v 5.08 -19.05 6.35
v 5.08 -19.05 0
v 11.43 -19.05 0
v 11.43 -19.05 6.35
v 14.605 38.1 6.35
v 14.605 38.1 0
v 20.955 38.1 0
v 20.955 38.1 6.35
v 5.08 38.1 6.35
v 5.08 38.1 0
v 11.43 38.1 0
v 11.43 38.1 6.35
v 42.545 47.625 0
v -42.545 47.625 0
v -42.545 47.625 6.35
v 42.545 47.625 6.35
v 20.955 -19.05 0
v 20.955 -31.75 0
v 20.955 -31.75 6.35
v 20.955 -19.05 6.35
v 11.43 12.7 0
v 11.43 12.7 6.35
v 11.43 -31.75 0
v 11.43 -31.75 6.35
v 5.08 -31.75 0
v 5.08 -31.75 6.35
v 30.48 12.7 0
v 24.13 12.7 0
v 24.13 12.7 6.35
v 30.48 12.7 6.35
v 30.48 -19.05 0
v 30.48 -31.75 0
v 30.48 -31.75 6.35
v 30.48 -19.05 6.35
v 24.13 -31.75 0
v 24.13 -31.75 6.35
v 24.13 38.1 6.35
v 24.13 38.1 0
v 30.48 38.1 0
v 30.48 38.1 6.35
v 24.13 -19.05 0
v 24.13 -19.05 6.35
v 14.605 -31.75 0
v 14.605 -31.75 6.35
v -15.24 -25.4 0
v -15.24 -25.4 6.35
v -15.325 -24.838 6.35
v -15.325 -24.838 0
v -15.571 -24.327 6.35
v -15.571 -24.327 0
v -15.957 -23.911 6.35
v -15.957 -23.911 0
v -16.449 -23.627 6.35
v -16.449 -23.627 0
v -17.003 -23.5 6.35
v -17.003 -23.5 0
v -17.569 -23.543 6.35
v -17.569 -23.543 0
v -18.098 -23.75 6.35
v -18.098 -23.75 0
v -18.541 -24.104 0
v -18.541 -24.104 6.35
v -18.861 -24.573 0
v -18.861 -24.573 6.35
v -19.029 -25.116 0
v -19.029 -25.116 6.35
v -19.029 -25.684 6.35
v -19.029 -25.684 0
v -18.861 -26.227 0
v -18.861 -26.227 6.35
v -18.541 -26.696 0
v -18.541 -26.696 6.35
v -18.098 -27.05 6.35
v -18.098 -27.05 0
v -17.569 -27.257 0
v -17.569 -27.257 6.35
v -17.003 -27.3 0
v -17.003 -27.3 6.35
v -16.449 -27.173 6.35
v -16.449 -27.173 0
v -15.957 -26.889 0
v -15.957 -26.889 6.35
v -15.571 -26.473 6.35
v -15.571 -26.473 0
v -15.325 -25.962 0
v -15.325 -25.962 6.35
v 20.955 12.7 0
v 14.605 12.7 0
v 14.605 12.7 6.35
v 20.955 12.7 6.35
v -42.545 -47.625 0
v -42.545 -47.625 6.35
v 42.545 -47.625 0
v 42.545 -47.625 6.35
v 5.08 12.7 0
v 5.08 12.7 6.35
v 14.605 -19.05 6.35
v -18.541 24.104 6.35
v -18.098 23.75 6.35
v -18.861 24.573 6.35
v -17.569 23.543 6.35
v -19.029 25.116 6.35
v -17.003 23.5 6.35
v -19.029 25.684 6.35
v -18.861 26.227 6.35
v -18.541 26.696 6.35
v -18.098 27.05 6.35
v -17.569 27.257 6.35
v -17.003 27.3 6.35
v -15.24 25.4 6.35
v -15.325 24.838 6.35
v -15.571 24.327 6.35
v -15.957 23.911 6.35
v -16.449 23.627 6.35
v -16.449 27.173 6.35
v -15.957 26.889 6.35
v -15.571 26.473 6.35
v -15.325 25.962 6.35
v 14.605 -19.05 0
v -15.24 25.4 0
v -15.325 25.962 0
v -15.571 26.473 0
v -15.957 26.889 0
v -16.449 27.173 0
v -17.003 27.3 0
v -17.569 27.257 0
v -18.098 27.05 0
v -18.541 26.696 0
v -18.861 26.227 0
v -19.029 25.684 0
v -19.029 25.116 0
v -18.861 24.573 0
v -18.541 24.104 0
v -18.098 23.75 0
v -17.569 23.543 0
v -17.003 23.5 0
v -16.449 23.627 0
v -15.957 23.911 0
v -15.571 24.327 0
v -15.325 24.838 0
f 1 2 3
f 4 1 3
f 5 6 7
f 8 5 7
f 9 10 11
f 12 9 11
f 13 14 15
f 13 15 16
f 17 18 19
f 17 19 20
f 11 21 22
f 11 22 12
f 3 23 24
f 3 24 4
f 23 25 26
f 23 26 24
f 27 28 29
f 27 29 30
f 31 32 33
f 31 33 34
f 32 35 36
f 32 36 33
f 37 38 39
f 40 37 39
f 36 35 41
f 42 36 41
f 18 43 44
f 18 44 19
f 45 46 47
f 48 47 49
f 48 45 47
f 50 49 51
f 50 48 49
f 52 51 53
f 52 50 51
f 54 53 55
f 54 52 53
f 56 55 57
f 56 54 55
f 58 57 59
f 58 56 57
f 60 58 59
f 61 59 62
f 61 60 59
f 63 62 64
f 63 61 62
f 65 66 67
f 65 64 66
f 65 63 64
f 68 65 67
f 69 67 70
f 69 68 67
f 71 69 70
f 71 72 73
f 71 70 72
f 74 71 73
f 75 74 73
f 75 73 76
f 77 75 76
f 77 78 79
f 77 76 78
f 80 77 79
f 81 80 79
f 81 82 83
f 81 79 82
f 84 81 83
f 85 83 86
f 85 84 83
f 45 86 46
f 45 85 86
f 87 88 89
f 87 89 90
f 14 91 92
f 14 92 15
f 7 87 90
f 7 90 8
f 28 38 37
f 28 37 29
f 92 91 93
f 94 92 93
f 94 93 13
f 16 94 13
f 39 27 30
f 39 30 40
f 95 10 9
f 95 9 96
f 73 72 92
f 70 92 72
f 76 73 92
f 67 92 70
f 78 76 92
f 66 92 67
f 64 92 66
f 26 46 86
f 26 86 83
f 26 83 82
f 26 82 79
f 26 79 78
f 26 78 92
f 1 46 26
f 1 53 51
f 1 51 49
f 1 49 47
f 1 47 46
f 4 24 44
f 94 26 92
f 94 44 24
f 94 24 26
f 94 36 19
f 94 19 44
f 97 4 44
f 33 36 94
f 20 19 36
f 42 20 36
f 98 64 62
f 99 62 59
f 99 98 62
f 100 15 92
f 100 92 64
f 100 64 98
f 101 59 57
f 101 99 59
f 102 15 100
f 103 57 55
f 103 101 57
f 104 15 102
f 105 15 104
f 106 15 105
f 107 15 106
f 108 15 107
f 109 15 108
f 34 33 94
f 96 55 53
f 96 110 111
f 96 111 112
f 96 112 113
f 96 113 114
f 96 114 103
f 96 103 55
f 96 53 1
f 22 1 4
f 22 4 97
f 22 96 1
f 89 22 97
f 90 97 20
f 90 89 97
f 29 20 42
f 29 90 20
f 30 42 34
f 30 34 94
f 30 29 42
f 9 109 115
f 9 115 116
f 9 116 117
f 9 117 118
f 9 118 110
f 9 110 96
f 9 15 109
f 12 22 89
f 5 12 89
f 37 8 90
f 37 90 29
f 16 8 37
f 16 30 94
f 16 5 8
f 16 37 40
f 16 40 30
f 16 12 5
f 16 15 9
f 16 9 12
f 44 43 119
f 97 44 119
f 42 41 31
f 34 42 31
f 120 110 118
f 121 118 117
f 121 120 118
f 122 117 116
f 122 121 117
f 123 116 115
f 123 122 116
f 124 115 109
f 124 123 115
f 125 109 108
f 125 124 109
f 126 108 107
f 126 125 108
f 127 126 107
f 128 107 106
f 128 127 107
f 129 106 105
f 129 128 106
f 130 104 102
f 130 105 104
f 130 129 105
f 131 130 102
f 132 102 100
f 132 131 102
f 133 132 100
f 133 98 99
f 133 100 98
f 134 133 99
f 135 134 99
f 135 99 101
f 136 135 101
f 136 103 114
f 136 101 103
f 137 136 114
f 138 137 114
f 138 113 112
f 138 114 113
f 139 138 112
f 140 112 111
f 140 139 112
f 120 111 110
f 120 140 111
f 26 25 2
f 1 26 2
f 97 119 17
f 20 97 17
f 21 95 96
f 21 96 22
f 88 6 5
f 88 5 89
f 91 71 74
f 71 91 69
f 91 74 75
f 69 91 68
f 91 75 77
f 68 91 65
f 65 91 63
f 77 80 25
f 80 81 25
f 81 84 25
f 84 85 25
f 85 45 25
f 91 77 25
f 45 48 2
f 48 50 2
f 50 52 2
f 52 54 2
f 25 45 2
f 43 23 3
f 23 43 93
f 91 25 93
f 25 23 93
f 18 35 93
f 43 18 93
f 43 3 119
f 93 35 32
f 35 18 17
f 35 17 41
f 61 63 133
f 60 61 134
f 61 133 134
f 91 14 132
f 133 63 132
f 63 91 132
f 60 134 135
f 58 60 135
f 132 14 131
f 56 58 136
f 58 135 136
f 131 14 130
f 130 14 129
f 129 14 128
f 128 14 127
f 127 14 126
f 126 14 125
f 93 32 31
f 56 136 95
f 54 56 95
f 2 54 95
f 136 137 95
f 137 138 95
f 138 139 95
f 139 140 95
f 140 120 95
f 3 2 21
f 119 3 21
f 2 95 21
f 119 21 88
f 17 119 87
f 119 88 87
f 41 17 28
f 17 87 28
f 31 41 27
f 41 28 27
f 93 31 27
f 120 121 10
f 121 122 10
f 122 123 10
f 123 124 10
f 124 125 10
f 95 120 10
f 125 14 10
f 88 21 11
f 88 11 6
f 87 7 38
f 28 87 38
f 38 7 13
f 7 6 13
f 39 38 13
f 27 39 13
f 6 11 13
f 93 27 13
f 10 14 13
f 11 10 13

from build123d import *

# Parameters (mm, degrees)
F0_W     = 85.09
F0_H     = 95.25
F1_DEPTH = 6.35
F2_R     = 1.905
F2_W     = 6.35
F2_H     = 12.7
F2_H_2   = 6.35
F3_DEPTH = 6.351
F4_DEPTH = 132


# Not quite as in the source:
# - an extrude ends at something that could not be found from the text; its depth is read off the source's solid


with BuildPart() as f1:
    # F0 (on Top) → F1 (new body)
    with BuildSketch(Plane.XY):
        Rectangle(F0_W, F0_H)
    extrude(amount=F1_DEPTH)

    # F2 (on Top) → F3 (cut, through all)
    with BuildSketch(Plane.XY):
        with Locations((-17.145, -25.4)):
            Circle(F2_R)
        with Locations((-17.145, 25.4)):
            Circle(F2_R)
        with Locations((8.255, -25.4)):
            Rectangle(F2_W, F2_H)
        with Locations((8.255, 34.925)):
            Rectangle(F2_W, F2_H_2)
        with Locations((8.255, 25.4)):
            Rectangle(F2_W, F2_H)
        with Locations((8.255, 15.875)):
            Rectangle(F2_W, F2_H_2)
        with Locations((27.305, 25.4)):
            Rectangle(F2_W, F2_H)
        with Locations((27.305, 34.925)):
            Rectangle(F2_W, F2_H_2)
        with Locations((27.305, 15.875)):
            Rectangle(F2_W, F2_H_2)
        with Locations((27.305, -25.4)):
            Rectangle(F2_W, F2_H)
        with Locations((17.78, 34.925)):
            Rectangle(F2_W, F2_H_2)
        with Locations((17.78, 25.4)):
            Rectangle(F2_W, F2_H)
        with Locations((17.78, 15.875)):
            Rectangle(F2_W, F2_H_2)
        with Locations((17.78, -25.4)):
            Rectangle(F2_W, F2_H)
    extrude(amount=F3_DEPTH, mode=Mode.SUBTRACT)

    # F2 (on Top) → F4 (cut, through all)
    with BuildSketch(Plane.XY):
        with Locations((-17.145, -25.4)):
            Circle(F2_R)
        with Locations((-17.145, 25.4)):
            Circle(F2_R)
        with Locations((8.255, -25.4)):
            Rectangle(F2_W, F2_H)
        with Locations((8.255, 34.925)):
            Rectangle(F2_W, F2_H_2)
        with Locations((8.255, 25.4)):
            Rectangle(F2_W, F2_H)
        with Locations((8.255, 15.875)):
            Rectangle(F2_W, F2_H_2)
        with Locations((27.305, 25.4)):
            Rectangle(F2_W, F2_H)
        with Locations((27.305, 34.925)):
            Rectangle(F2_W, F2_H_2)
        with Locations((27.305, 15.875)):
            Rectangle(F2_W, F2_H_2)
        with Locations((27.305, -25.4)):
            Rectangle(F2_W, F2_H)
        with Locations((17.78, 34.925)):
            Rectangle(F2_W, F2_H_2)
        with Locations((17.78, 25.4)):
            Rectangle(F2_W, F2_H)
        with Locations((17.78, 15.875)):
            Rectangle(F2_W, F2_H_2)
        with Locations((17.78, -25.4)):
            Rectangle(F2_W, F2_H)
    extrude(amount=-F4_DEPTH, mode=Mode.SUBTRACT)


solid = f1.part
